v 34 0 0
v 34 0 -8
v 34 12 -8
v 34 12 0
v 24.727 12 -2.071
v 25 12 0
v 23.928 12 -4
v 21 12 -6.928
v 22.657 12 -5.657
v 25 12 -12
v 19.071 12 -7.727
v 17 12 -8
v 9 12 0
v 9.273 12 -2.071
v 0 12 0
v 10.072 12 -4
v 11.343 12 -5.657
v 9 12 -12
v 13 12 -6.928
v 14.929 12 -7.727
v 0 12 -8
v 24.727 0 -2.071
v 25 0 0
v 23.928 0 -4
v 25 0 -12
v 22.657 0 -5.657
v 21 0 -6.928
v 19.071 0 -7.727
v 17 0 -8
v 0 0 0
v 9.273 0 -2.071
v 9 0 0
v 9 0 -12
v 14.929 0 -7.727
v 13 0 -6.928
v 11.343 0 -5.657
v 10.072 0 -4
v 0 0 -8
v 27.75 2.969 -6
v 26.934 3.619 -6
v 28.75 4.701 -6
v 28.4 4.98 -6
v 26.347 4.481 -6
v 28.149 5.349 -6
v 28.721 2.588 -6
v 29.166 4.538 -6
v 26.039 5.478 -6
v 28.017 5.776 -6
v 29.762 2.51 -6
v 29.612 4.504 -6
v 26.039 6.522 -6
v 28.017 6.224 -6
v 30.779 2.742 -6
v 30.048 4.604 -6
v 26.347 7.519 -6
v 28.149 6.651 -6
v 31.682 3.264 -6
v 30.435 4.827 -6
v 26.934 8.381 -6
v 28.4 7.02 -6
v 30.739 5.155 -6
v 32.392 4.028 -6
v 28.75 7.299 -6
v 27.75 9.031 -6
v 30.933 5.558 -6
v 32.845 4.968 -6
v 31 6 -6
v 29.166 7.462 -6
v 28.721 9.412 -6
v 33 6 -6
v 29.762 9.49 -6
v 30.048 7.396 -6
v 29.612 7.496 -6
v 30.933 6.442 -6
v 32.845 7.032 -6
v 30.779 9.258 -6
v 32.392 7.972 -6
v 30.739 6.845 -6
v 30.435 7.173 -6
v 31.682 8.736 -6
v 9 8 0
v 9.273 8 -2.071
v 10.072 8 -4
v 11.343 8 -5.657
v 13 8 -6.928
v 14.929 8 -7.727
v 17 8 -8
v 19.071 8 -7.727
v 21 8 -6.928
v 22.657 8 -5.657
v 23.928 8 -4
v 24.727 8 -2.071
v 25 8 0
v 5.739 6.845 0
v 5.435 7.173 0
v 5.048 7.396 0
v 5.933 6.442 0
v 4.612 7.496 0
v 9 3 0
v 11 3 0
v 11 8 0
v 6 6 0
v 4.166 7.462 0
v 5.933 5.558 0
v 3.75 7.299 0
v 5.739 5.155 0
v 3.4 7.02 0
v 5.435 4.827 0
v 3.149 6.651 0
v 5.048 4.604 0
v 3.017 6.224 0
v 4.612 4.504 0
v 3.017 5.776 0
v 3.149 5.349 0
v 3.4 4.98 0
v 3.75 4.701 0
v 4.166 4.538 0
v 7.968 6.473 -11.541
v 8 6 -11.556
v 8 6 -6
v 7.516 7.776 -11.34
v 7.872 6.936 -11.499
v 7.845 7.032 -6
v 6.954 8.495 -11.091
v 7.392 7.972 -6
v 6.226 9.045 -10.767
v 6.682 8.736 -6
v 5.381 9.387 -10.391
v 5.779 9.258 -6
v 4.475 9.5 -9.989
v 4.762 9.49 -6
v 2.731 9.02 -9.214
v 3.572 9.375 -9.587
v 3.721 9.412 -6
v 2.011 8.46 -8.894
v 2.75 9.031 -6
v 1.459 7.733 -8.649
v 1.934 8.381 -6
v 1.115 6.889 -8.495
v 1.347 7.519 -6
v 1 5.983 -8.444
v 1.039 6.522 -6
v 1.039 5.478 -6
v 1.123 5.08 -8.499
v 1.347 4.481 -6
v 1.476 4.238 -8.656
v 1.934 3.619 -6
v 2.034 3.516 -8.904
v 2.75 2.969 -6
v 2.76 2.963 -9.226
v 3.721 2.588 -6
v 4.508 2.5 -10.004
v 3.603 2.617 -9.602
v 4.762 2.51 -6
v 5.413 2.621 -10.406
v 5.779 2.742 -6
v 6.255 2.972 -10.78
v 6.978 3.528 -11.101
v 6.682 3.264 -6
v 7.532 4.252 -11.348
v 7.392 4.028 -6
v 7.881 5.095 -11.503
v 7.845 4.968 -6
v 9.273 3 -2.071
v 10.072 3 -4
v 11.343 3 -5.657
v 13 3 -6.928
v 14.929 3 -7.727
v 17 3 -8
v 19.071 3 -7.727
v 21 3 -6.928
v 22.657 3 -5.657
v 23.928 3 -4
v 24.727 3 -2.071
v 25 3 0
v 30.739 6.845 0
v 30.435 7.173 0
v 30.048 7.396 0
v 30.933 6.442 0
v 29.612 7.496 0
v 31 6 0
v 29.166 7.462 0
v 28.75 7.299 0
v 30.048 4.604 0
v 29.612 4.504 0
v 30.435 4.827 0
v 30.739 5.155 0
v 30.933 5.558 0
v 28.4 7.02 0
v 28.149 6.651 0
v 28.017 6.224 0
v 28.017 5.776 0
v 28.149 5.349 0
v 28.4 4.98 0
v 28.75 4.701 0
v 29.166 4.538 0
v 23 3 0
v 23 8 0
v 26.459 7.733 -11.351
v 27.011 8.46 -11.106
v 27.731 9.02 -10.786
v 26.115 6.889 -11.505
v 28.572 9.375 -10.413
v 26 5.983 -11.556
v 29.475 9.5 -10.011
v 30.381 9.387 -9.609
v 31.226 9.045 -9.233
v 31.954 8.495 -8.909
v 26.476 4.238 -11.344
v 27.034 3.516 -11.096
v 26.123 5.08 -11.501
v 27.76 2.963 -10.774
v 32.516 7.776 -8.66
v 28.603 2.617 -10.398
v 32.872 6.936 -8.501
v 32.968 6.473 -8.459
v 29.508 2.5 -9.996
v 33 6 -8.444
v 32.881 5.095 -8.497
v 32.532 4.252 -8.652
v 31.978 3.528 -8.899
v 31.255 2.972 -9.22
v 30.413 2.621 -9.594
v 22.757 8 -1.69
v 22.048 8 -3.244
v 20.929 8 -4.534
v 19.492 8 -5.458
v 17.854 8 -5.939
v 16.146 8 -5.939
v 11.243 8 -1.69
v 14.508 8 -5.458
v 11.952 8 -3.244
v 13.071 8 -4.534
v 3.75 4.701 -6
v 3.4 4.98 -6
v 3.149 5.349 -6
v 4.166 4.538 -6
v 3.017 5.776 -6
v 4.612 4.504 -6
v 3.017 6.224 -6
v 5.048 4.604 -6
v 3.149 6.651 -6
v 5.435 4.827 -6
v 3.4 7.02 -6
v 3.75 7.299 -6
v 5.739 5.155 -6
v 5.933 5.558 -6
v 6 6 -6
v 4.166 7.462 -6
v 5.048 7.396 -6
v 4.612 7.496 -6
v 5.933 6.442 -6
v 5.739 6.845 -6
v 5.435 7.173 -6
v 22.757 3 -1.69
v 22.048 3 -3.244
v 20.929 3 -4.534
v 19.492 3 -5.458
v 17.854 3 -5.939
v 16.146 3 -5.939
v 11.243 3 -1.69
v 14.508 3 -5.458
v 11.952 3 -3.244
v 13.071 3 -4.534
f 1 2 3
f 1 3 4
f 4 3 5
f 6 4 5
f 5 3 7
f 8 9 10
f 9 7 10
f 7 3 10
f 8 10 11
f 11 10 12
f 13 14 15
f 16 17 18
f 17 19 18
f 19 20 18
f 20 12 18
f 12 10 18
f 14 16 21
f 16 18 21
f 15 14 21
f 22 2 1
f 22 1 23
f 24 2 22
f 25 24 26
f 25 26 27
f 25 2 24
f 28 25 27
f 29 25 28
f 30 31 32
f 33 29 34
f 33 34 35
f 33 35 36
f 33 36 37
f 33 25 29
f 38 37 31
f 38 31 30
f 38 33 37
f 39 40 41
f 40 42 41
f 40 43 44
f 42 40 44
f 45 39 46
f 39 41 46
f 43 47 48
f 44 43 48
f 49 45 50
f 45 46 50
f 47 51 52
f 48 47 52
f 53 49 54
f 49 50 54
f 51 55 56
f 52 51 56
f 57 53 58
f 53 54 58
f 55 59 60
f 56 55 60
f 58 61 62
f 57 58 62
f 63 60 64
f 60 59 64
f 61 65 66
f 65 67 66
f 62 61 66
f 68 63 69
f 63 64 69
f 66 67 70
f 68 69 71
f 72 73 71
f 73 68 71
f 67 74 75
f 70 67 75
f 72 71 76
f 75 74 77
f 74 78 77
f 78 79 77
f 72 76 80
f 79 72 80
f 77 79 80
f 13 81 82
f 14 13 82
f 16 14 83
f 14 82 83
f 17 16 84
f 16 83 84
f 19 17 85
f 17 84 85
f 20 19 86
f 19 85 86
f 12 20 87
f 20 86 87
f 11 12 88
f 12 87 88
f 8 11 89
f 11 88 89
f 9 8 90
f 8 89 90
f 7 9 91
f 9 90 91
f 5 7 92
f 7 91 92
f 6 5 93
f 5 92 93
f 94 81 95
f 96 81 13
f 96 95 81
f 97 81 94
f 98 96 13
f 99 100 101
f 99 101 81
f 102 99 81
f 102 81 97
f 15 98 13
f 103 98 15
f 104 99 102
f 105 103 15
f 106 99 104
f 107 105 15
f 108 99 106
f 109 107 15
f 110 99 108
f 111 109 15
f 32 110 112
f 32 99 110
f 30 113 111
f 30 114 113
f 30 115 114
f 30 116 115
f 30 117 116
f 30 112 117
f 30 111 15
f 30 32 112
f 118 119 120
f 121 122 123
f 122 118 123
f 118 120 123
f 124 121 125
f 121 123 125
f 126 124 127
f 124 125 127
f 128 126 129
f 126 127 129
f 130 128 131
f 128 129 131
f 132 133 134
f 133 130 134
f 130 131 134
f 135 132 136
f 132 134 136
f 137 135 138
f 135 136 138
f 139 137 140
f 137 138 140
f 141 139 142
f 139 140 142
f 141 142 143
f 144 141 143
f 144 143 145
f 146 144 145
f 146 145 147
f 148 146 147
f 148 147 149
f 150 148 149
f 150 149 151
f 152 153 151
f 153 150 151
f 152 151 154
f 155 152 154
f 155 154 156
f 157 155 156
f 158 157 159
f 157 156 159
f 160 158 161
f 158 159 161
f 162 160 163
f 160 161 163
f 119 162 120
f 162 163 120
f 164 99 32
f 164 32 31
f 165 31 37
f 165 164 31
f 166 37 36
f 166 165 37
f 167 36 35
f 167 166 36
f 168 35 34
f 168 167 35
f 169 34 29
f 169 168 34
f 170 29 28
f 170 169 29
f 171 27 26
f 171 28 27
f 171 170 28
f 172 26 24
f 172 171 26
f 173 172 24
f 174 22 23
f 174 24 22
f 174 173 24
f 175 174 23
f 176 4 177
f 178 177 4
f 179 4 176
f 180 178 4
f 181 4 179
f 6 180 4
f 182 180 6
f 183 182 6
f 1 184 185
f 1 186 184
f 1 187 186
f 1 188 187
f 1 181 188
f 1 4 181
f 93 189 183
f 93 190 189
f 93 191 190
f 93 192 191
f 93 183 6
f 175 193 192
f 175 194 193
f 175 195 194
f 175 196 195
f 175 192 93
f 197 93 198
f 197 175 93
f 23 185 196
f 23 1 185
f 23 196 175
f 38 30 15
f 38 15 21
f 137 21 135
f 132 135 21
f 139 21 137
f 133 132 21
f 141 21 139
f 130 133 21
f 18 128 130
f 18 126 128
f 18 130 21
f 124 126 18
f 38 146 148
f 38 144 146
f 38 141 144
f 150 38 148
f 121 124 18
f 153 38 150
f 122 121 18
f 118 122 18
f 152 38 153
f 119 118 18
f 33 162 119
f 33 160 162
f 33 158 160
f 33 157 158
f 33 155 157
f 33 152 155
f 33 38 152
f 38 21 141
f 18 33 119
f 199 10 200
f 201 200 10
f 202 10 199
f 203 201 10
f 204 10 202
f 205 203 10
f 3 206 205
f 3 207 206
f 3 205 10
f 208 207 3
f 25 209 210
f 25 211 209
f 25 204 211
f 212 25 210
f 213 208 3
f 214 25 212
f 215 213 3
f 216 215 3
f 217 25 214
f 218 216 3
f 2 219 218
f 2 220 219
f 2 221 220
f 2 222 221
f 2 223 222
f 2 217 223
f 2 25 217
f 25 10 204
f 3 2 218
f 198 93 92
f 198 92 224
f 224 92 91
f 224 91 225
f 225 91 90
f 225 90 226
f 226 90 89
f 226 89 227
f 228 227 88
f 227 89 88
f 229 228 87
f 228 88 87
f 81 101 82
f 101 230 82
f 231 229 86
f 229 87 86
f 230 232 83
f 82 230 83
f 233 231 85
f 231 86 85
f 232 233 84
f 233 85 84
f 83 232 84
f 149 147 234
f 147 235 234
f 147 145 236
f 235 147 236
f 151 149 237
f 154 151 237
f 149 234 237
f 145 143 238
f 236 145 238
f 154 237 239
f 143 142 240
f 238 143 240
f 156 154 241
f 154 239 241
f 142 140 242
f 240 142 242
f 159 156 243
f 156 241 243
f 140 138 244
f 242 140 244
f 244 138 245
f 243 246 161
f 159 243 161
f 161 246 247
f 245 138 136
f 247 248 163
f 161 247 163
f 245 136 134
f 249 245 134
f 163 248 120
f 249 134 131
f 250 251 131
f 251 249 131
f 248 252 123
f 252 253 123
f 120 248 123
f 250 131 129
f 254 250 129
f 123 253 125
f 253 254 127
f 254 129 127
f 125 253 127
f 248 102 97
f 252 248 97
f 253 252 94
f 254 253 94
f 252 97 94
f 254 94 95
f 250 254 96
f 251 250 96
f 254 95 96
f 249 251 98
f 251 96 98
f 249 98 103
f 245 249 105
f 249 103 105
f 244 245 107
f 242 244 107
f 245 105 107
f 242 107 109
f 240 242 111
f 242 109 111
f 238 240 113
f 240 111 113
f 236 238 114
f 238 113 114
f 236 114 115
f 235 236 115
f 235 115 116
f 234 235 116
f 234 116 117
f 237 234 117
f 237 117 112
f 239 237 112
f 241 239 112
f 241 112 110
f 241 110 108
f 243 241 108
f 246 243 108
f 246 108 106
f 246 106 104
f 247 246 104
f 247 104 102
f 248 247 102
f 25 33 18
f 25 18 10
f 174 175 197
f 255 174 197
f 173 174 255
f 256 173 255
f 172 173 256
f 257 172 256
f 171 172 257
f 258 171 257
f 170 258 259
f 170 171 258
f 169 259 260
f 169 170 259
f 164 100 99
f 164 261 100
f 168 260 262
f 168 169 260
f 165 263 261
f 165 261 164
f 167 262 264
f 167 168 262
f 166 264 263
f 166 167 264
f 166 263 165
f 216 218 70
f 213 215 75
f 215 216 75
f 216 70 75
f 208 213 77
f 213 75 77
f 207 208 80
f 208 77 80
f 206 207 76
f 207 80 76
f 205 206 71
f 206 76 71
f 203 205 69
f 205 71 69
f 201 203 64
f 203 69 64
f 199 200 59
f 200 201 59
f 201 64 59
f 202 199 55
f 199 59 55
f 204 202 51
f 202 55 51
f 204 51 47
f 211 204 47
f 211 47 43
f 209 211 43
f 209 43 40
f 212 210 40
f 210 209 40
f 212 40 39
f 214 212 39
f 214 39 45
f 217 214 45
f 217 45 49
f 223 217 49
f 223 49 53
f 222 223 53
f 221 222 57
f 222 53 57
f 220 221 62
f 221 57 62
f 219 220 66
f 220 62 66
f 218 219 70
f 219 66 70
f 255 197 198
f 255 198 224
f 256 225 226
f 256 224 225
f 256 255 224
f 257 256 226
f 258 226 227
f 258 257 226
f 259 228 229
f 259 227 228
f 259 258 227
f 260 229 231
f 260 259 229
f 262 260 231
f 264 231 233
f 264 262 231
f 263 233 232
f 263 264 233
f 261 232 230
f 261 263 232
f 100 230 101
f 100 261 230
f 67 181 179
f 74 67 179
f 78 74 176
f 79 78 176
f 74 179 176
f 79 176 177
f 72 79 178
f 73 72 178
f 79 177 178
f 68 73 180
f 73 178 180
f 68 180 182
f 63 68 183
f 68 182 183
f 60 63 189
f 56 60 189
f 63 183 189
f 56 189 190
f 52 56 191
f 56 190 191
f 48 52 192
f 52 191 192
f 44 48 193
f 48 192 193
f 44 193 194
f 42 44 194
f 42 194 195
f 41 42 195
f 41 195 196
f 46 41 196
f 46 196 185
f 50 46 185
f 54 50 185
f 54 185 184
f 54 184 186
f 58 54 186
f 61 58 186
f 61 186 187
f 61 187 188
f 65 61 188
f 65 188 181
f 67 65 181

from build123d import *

# Parameters (mm, degrees)
EXTRUDE_1_DEPTH          = 12
SKETCH_3_R               = 1.5
CUT_EXTRUDE_1_DEPTH      = 39
CUT_EXTRUDE_START        = -6
SKETCH_4_R               = 3.5
CUT_EXTRUDE_2_DEPTH      = 33
SKETCH_5_R               = 3.5
CUT_EXTRUDE_4_DEPTH      = 33
CUT_EXTRUDE_6_DEPTH      = 39
CUT_EXTRUDE_6_DEPTH_BACK = 4
CUT_EXTRUDE_7_DEPTH      = 39
CUT_EXTRUDE_7_DEPTH_BACK = 3


with BuildPart() as part:
    # Эскиз2 → Бобышка-Вытянуть1 (new body)
    with BuildSketch(Plane(origin=(0, 0, 0), x_dir=(1, 0, 0), z_dir=(0, 1, 0))):
        with BuildLine():
            Line((0, 0), (0, 8))
            Line((0, 8), (9, 12))
            Line((9, 12), (25, 12))
            Line((25, 12), (34, 8))
            Line((34, 8), (34, 0))
            Line((34, 0), (23, 0))
            ThreePointArc((23, 0), (17, 6), (11, 0))
            Line((11, 0), (0, 0))
        make_face()
    extrude(amount=EXTRUDE_1_DEPTH)

    # Эскиз3 → Вырез-Вытянуть1 (cut, through all)
    with BuildSketch(Plane.XY):
        with Locations((4.5, 6)):
            Circle(SKETCH_3_R)
        with Locations((29.5, 6)):
            Circle(SKETCH_3_R)
    extrude(amount=-CUT_EXTRUDE_1_DEPTH, mode=Mode.SUBTRACT)

    # Эскиз4 → Вырез-Вытянуть2 (cut, through all)
    with BuildSketch(Plane.XY.offset(CUT_EXTRUDE_START)):
        with Locations((4.5, 6)):
            Circle(SKETCH_4_R)
    extrude(amount=-CUT_EXTRUDE_2_DEPTH, mode=Mode.SUBTRACT)

    # Эскиз5 → Вырез-Вытянуть4 (cut, through all)
    with BuildSketch(Plane.XY.offset(CUT_EXTRUDE_START)):
        with Locations((29.5, 6)):
            Circle(SKETCH_5_R)
    extrude(amount=-CUT_EXTRUDE_4_DEPTH, mode=Mode.SUBTRACT)

    # Эскиз6 → Вырез-Вытянуть6 (cut, two sides: drawn at the far end of the back side and taken through both)
    with BuildSketch(Plane(origin=(0, 12, 0), x_dir=(1, 0, 0), z_dir=(0, 1, 0)).offset(-CUT_EXTRUDE_6_DEPTH_BACK)):
        with BuildLine():
            Line((9, -65.461698495), (9, 0))
            ThreePointArc((9, 0), (17, 8), (25, 0))
            Line((25, 0), (25, -65.461698495))
            Line((25, -65.461698495), (25, -196.385095486))
            Line((25, -196.385095486), (9, -196.385095486))
            Line((9, -196.385095486), (9, -65.461698495))
        make_face()
    extrude(amount=CUT_EXTRUDE_6_DEPTH + CUT_EXTRUDE_6_DEPTH_BACK, mode=Mode.SUBTRACT)

    # Эскиз7 → Вырез-Вытянуть7 (cut, two sides: drawn at the far end of the back side and taken through both)
    with BuildSketch(Plane(origin=(0, 0, 0), x_dir=(-1, 0, 0), z_dir=(0, -1, 0)).offset(-CUT_EXTRUDE_7_DEPTH_BACK)):
        with BuildLine():
            Line((-9, -65.461698495), (-9, 0))
            ThreePointArc((-9, 0), (-17, 8), (-25, 0))
            Line((-25, 0), (-25, -65.461698495))
            Line((-25, -65.461698495), (-25, -196.385095486))
            Line((-25, -196.385095486), (-9, -196.385095486))
            Line((-9, -196.385095486), (-9, -65.461698495))
        make_face()
    extrude(amount=CUT_EXTRUDE_7_DEPTH + CUT_EXTRUDE_7_DEPTH_BACK, mode=Mode.SUBTRACT)


solid = part.part
